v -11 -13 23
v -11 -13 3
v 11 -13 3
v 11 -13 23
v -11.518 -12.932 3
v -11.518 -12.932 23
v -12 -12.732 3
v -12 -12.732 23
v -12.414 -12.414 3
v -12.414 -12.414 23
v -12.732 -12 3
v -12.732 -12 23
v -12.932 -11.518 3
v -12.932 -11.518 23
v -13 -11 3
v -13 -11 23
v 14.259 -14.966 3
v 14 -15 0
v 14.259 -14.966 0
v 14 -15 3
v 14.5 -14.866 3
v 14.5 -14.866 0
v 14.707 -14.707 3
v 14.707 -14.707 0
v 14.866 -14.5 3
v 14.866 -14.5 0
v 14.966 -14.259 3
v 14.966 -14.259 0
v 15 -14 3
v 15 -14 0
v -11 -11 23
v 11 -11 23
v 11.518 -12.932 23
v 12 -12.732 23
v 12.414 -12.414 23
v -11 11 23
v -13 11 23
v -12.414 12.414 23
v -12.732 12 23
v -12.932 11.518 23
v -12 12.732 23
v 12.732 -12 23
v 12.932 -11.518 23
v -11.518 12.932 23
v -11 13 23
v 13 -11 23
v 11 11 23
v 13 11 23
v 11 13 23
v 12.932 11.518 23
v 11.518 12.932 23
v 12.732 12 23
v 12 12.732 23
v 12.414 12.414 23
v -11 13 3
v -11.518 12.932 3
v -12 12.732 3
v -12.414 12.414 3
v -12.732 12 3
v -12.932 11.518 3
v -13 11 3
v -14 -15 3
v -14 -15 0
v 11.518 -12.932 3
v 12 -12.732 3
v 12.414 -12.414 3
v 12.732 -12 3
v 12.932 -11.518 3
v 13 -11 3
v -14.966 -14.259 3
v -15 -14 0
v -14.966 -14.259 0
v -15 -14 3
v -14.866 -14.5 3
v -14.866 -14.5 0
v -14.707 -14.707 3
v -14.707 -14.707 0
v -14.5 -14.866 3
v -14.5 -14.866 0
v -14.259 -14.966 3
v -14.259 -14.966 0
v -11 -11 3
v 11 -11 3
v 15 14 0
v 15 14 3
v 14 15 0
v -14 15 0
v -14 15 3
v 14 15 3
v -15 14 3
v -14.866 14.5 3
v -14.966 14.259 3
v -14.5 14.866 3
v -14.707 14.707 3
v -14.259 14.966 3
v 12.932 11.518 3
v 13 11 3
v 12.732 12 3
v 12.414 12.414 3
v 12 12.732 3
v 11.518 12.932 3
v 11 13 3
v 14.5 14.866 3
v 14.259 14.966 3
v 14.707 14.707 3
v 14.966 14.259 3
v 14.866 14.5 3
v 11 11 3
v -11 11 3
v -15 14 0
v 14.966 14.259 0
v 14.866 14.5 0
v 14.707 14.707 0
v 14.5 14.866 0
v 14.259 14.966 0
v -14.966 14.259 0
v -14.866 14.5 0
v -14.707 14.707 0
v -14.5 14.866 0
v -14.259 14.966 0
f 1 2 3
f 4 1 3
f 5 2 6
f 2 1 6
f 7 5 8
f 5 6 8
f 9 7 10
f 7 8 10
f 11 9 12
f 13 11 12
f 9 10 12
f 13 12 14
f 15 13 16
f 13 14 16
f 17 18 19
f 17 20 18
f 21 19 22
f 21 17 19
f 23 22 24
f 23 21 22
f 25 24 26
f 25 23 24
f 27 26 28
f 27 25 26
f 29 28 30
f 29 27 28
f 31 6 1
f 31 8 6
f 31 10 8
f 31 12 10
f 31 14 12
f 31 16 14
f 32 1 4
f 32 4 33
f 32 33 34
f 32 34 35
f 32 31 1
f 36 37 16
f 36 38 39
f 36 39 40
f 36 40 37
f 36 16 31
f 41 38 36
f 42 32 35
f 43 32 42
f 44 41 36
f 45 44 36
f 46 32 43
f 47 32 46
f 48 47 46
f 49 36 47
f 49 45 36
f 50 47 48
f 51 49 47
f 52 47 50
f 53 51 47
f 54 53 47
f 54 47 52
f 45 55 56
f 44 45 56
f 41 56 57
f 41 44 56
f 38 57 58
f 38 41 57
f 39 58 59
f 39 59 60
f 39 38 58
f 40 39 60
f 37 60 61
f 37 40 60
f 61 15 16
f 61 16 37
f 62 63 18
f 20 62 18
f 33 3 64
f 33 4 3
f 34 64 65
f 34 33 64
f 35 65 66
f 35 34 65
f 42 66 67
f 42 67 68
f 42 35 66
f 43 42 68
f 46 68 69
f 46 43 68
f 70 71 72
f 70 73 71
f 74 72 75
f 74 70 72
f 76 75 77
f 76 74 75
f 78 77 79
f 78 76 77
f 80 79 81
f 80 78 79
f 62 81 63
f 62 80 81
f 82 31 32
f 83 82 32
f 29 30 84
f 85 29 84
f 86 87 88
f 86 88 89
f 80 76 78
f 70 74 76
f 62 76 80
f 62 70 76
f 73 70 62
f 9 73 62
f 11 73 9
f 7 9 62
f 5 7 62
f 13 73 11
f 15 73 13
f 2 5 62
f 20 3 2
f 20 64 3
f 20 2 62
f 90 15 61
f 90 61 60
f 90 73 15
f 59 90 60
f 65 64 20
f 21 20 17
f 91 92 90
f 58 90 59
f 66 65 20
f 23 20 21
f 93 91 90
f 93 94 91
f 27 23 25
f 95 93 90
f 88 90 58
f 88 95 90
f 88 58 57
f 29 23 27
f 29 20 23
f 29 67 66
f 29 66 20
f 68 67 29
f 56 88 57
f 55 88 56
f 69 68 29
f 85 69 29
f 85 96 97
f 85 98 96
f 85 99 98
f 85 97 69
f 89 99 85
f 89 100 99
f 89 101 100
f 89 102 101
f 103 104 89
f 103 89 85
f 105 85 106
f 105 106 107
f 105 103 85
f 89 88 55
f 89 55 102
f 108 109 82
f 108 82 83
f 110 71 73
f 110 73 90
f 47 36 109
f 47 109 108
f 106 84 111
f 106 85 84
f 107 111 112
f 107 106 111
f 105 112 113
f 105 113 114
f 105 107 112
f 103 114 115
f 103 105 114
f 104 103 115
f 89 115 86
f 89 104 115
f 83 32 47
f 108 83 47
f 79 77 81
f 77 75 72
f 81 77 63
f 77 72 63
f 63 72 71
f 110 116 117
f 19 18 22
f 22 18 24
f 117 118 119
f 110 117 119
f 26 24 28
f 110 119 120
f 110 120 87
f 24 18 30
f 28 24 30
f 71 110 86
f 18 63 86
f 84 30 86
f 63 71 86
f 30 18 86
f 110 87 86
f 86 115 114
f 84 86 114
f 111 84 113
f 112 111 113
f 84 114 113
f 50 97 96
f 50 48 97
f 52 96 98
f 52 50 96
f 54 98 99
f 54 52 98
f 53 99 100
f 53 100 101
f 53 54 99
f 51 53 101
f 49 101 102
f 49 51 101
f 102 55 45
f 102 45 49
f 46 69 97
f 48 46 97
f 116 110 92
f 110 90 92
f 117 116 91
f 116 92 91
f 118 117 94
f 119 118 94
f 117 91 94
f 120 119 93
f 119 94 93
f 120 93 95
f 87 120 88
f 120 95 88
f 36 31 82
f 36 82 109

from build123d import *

# Parameters (mm, degrees)
F0_W     = 30
F0_H     = 30
F1_DEPTH = 3
F2_R     = 1
F3_W     = 26
F3_H     = 26
F4_DEPTH = 20
F5_R     = 2
F6_W     = 22
F6_H     = 22
F7_DEPTH = 20


with BuildPart() as f1:
    # F0 (on Top) → F1 (new body)
    with BuildSketch(Plane.XY):
        Rectangle(F0_W, F0_H)
    extrude(amount=F1_DEPTH)

    # F2
    f2_edges = [f1.edges().sort_by_distance(p)[0] for p in [
        (-15, 15, 1.5),
        (-15, -15, 1.5),
        (15, -15, 1.5),
        (15, 15, 1.5),
    ]]
    fillet(f2_edges, radius=F2_R)

    # F3 (on face) → F4 (join)
    with BuildSketch(Plane.XY.offset(3)):
        Rectangle(F3_W, F3_H)
    extrude(amount=F4_DEPTH)

    # F5
    f5_edges = [f1.edges().sort_by_distance(p)[0] for p in [
        (-13, -13, 13),
        (13, -13, 13),
        (13, 13, 13),
        (-13, 13, 13),
    ]]
    fillet(f5_edges, radius=F5_R)

    # F6 (on face) → F7 (cut, through all)
    with BuildSketch(Plane.XY.offset(23)):
        Rectangle(F6_W, F6_H)
    extrude(amount=-F7_DEPTH, mode=Mode.SUBTRACT)


solid = f1.part
